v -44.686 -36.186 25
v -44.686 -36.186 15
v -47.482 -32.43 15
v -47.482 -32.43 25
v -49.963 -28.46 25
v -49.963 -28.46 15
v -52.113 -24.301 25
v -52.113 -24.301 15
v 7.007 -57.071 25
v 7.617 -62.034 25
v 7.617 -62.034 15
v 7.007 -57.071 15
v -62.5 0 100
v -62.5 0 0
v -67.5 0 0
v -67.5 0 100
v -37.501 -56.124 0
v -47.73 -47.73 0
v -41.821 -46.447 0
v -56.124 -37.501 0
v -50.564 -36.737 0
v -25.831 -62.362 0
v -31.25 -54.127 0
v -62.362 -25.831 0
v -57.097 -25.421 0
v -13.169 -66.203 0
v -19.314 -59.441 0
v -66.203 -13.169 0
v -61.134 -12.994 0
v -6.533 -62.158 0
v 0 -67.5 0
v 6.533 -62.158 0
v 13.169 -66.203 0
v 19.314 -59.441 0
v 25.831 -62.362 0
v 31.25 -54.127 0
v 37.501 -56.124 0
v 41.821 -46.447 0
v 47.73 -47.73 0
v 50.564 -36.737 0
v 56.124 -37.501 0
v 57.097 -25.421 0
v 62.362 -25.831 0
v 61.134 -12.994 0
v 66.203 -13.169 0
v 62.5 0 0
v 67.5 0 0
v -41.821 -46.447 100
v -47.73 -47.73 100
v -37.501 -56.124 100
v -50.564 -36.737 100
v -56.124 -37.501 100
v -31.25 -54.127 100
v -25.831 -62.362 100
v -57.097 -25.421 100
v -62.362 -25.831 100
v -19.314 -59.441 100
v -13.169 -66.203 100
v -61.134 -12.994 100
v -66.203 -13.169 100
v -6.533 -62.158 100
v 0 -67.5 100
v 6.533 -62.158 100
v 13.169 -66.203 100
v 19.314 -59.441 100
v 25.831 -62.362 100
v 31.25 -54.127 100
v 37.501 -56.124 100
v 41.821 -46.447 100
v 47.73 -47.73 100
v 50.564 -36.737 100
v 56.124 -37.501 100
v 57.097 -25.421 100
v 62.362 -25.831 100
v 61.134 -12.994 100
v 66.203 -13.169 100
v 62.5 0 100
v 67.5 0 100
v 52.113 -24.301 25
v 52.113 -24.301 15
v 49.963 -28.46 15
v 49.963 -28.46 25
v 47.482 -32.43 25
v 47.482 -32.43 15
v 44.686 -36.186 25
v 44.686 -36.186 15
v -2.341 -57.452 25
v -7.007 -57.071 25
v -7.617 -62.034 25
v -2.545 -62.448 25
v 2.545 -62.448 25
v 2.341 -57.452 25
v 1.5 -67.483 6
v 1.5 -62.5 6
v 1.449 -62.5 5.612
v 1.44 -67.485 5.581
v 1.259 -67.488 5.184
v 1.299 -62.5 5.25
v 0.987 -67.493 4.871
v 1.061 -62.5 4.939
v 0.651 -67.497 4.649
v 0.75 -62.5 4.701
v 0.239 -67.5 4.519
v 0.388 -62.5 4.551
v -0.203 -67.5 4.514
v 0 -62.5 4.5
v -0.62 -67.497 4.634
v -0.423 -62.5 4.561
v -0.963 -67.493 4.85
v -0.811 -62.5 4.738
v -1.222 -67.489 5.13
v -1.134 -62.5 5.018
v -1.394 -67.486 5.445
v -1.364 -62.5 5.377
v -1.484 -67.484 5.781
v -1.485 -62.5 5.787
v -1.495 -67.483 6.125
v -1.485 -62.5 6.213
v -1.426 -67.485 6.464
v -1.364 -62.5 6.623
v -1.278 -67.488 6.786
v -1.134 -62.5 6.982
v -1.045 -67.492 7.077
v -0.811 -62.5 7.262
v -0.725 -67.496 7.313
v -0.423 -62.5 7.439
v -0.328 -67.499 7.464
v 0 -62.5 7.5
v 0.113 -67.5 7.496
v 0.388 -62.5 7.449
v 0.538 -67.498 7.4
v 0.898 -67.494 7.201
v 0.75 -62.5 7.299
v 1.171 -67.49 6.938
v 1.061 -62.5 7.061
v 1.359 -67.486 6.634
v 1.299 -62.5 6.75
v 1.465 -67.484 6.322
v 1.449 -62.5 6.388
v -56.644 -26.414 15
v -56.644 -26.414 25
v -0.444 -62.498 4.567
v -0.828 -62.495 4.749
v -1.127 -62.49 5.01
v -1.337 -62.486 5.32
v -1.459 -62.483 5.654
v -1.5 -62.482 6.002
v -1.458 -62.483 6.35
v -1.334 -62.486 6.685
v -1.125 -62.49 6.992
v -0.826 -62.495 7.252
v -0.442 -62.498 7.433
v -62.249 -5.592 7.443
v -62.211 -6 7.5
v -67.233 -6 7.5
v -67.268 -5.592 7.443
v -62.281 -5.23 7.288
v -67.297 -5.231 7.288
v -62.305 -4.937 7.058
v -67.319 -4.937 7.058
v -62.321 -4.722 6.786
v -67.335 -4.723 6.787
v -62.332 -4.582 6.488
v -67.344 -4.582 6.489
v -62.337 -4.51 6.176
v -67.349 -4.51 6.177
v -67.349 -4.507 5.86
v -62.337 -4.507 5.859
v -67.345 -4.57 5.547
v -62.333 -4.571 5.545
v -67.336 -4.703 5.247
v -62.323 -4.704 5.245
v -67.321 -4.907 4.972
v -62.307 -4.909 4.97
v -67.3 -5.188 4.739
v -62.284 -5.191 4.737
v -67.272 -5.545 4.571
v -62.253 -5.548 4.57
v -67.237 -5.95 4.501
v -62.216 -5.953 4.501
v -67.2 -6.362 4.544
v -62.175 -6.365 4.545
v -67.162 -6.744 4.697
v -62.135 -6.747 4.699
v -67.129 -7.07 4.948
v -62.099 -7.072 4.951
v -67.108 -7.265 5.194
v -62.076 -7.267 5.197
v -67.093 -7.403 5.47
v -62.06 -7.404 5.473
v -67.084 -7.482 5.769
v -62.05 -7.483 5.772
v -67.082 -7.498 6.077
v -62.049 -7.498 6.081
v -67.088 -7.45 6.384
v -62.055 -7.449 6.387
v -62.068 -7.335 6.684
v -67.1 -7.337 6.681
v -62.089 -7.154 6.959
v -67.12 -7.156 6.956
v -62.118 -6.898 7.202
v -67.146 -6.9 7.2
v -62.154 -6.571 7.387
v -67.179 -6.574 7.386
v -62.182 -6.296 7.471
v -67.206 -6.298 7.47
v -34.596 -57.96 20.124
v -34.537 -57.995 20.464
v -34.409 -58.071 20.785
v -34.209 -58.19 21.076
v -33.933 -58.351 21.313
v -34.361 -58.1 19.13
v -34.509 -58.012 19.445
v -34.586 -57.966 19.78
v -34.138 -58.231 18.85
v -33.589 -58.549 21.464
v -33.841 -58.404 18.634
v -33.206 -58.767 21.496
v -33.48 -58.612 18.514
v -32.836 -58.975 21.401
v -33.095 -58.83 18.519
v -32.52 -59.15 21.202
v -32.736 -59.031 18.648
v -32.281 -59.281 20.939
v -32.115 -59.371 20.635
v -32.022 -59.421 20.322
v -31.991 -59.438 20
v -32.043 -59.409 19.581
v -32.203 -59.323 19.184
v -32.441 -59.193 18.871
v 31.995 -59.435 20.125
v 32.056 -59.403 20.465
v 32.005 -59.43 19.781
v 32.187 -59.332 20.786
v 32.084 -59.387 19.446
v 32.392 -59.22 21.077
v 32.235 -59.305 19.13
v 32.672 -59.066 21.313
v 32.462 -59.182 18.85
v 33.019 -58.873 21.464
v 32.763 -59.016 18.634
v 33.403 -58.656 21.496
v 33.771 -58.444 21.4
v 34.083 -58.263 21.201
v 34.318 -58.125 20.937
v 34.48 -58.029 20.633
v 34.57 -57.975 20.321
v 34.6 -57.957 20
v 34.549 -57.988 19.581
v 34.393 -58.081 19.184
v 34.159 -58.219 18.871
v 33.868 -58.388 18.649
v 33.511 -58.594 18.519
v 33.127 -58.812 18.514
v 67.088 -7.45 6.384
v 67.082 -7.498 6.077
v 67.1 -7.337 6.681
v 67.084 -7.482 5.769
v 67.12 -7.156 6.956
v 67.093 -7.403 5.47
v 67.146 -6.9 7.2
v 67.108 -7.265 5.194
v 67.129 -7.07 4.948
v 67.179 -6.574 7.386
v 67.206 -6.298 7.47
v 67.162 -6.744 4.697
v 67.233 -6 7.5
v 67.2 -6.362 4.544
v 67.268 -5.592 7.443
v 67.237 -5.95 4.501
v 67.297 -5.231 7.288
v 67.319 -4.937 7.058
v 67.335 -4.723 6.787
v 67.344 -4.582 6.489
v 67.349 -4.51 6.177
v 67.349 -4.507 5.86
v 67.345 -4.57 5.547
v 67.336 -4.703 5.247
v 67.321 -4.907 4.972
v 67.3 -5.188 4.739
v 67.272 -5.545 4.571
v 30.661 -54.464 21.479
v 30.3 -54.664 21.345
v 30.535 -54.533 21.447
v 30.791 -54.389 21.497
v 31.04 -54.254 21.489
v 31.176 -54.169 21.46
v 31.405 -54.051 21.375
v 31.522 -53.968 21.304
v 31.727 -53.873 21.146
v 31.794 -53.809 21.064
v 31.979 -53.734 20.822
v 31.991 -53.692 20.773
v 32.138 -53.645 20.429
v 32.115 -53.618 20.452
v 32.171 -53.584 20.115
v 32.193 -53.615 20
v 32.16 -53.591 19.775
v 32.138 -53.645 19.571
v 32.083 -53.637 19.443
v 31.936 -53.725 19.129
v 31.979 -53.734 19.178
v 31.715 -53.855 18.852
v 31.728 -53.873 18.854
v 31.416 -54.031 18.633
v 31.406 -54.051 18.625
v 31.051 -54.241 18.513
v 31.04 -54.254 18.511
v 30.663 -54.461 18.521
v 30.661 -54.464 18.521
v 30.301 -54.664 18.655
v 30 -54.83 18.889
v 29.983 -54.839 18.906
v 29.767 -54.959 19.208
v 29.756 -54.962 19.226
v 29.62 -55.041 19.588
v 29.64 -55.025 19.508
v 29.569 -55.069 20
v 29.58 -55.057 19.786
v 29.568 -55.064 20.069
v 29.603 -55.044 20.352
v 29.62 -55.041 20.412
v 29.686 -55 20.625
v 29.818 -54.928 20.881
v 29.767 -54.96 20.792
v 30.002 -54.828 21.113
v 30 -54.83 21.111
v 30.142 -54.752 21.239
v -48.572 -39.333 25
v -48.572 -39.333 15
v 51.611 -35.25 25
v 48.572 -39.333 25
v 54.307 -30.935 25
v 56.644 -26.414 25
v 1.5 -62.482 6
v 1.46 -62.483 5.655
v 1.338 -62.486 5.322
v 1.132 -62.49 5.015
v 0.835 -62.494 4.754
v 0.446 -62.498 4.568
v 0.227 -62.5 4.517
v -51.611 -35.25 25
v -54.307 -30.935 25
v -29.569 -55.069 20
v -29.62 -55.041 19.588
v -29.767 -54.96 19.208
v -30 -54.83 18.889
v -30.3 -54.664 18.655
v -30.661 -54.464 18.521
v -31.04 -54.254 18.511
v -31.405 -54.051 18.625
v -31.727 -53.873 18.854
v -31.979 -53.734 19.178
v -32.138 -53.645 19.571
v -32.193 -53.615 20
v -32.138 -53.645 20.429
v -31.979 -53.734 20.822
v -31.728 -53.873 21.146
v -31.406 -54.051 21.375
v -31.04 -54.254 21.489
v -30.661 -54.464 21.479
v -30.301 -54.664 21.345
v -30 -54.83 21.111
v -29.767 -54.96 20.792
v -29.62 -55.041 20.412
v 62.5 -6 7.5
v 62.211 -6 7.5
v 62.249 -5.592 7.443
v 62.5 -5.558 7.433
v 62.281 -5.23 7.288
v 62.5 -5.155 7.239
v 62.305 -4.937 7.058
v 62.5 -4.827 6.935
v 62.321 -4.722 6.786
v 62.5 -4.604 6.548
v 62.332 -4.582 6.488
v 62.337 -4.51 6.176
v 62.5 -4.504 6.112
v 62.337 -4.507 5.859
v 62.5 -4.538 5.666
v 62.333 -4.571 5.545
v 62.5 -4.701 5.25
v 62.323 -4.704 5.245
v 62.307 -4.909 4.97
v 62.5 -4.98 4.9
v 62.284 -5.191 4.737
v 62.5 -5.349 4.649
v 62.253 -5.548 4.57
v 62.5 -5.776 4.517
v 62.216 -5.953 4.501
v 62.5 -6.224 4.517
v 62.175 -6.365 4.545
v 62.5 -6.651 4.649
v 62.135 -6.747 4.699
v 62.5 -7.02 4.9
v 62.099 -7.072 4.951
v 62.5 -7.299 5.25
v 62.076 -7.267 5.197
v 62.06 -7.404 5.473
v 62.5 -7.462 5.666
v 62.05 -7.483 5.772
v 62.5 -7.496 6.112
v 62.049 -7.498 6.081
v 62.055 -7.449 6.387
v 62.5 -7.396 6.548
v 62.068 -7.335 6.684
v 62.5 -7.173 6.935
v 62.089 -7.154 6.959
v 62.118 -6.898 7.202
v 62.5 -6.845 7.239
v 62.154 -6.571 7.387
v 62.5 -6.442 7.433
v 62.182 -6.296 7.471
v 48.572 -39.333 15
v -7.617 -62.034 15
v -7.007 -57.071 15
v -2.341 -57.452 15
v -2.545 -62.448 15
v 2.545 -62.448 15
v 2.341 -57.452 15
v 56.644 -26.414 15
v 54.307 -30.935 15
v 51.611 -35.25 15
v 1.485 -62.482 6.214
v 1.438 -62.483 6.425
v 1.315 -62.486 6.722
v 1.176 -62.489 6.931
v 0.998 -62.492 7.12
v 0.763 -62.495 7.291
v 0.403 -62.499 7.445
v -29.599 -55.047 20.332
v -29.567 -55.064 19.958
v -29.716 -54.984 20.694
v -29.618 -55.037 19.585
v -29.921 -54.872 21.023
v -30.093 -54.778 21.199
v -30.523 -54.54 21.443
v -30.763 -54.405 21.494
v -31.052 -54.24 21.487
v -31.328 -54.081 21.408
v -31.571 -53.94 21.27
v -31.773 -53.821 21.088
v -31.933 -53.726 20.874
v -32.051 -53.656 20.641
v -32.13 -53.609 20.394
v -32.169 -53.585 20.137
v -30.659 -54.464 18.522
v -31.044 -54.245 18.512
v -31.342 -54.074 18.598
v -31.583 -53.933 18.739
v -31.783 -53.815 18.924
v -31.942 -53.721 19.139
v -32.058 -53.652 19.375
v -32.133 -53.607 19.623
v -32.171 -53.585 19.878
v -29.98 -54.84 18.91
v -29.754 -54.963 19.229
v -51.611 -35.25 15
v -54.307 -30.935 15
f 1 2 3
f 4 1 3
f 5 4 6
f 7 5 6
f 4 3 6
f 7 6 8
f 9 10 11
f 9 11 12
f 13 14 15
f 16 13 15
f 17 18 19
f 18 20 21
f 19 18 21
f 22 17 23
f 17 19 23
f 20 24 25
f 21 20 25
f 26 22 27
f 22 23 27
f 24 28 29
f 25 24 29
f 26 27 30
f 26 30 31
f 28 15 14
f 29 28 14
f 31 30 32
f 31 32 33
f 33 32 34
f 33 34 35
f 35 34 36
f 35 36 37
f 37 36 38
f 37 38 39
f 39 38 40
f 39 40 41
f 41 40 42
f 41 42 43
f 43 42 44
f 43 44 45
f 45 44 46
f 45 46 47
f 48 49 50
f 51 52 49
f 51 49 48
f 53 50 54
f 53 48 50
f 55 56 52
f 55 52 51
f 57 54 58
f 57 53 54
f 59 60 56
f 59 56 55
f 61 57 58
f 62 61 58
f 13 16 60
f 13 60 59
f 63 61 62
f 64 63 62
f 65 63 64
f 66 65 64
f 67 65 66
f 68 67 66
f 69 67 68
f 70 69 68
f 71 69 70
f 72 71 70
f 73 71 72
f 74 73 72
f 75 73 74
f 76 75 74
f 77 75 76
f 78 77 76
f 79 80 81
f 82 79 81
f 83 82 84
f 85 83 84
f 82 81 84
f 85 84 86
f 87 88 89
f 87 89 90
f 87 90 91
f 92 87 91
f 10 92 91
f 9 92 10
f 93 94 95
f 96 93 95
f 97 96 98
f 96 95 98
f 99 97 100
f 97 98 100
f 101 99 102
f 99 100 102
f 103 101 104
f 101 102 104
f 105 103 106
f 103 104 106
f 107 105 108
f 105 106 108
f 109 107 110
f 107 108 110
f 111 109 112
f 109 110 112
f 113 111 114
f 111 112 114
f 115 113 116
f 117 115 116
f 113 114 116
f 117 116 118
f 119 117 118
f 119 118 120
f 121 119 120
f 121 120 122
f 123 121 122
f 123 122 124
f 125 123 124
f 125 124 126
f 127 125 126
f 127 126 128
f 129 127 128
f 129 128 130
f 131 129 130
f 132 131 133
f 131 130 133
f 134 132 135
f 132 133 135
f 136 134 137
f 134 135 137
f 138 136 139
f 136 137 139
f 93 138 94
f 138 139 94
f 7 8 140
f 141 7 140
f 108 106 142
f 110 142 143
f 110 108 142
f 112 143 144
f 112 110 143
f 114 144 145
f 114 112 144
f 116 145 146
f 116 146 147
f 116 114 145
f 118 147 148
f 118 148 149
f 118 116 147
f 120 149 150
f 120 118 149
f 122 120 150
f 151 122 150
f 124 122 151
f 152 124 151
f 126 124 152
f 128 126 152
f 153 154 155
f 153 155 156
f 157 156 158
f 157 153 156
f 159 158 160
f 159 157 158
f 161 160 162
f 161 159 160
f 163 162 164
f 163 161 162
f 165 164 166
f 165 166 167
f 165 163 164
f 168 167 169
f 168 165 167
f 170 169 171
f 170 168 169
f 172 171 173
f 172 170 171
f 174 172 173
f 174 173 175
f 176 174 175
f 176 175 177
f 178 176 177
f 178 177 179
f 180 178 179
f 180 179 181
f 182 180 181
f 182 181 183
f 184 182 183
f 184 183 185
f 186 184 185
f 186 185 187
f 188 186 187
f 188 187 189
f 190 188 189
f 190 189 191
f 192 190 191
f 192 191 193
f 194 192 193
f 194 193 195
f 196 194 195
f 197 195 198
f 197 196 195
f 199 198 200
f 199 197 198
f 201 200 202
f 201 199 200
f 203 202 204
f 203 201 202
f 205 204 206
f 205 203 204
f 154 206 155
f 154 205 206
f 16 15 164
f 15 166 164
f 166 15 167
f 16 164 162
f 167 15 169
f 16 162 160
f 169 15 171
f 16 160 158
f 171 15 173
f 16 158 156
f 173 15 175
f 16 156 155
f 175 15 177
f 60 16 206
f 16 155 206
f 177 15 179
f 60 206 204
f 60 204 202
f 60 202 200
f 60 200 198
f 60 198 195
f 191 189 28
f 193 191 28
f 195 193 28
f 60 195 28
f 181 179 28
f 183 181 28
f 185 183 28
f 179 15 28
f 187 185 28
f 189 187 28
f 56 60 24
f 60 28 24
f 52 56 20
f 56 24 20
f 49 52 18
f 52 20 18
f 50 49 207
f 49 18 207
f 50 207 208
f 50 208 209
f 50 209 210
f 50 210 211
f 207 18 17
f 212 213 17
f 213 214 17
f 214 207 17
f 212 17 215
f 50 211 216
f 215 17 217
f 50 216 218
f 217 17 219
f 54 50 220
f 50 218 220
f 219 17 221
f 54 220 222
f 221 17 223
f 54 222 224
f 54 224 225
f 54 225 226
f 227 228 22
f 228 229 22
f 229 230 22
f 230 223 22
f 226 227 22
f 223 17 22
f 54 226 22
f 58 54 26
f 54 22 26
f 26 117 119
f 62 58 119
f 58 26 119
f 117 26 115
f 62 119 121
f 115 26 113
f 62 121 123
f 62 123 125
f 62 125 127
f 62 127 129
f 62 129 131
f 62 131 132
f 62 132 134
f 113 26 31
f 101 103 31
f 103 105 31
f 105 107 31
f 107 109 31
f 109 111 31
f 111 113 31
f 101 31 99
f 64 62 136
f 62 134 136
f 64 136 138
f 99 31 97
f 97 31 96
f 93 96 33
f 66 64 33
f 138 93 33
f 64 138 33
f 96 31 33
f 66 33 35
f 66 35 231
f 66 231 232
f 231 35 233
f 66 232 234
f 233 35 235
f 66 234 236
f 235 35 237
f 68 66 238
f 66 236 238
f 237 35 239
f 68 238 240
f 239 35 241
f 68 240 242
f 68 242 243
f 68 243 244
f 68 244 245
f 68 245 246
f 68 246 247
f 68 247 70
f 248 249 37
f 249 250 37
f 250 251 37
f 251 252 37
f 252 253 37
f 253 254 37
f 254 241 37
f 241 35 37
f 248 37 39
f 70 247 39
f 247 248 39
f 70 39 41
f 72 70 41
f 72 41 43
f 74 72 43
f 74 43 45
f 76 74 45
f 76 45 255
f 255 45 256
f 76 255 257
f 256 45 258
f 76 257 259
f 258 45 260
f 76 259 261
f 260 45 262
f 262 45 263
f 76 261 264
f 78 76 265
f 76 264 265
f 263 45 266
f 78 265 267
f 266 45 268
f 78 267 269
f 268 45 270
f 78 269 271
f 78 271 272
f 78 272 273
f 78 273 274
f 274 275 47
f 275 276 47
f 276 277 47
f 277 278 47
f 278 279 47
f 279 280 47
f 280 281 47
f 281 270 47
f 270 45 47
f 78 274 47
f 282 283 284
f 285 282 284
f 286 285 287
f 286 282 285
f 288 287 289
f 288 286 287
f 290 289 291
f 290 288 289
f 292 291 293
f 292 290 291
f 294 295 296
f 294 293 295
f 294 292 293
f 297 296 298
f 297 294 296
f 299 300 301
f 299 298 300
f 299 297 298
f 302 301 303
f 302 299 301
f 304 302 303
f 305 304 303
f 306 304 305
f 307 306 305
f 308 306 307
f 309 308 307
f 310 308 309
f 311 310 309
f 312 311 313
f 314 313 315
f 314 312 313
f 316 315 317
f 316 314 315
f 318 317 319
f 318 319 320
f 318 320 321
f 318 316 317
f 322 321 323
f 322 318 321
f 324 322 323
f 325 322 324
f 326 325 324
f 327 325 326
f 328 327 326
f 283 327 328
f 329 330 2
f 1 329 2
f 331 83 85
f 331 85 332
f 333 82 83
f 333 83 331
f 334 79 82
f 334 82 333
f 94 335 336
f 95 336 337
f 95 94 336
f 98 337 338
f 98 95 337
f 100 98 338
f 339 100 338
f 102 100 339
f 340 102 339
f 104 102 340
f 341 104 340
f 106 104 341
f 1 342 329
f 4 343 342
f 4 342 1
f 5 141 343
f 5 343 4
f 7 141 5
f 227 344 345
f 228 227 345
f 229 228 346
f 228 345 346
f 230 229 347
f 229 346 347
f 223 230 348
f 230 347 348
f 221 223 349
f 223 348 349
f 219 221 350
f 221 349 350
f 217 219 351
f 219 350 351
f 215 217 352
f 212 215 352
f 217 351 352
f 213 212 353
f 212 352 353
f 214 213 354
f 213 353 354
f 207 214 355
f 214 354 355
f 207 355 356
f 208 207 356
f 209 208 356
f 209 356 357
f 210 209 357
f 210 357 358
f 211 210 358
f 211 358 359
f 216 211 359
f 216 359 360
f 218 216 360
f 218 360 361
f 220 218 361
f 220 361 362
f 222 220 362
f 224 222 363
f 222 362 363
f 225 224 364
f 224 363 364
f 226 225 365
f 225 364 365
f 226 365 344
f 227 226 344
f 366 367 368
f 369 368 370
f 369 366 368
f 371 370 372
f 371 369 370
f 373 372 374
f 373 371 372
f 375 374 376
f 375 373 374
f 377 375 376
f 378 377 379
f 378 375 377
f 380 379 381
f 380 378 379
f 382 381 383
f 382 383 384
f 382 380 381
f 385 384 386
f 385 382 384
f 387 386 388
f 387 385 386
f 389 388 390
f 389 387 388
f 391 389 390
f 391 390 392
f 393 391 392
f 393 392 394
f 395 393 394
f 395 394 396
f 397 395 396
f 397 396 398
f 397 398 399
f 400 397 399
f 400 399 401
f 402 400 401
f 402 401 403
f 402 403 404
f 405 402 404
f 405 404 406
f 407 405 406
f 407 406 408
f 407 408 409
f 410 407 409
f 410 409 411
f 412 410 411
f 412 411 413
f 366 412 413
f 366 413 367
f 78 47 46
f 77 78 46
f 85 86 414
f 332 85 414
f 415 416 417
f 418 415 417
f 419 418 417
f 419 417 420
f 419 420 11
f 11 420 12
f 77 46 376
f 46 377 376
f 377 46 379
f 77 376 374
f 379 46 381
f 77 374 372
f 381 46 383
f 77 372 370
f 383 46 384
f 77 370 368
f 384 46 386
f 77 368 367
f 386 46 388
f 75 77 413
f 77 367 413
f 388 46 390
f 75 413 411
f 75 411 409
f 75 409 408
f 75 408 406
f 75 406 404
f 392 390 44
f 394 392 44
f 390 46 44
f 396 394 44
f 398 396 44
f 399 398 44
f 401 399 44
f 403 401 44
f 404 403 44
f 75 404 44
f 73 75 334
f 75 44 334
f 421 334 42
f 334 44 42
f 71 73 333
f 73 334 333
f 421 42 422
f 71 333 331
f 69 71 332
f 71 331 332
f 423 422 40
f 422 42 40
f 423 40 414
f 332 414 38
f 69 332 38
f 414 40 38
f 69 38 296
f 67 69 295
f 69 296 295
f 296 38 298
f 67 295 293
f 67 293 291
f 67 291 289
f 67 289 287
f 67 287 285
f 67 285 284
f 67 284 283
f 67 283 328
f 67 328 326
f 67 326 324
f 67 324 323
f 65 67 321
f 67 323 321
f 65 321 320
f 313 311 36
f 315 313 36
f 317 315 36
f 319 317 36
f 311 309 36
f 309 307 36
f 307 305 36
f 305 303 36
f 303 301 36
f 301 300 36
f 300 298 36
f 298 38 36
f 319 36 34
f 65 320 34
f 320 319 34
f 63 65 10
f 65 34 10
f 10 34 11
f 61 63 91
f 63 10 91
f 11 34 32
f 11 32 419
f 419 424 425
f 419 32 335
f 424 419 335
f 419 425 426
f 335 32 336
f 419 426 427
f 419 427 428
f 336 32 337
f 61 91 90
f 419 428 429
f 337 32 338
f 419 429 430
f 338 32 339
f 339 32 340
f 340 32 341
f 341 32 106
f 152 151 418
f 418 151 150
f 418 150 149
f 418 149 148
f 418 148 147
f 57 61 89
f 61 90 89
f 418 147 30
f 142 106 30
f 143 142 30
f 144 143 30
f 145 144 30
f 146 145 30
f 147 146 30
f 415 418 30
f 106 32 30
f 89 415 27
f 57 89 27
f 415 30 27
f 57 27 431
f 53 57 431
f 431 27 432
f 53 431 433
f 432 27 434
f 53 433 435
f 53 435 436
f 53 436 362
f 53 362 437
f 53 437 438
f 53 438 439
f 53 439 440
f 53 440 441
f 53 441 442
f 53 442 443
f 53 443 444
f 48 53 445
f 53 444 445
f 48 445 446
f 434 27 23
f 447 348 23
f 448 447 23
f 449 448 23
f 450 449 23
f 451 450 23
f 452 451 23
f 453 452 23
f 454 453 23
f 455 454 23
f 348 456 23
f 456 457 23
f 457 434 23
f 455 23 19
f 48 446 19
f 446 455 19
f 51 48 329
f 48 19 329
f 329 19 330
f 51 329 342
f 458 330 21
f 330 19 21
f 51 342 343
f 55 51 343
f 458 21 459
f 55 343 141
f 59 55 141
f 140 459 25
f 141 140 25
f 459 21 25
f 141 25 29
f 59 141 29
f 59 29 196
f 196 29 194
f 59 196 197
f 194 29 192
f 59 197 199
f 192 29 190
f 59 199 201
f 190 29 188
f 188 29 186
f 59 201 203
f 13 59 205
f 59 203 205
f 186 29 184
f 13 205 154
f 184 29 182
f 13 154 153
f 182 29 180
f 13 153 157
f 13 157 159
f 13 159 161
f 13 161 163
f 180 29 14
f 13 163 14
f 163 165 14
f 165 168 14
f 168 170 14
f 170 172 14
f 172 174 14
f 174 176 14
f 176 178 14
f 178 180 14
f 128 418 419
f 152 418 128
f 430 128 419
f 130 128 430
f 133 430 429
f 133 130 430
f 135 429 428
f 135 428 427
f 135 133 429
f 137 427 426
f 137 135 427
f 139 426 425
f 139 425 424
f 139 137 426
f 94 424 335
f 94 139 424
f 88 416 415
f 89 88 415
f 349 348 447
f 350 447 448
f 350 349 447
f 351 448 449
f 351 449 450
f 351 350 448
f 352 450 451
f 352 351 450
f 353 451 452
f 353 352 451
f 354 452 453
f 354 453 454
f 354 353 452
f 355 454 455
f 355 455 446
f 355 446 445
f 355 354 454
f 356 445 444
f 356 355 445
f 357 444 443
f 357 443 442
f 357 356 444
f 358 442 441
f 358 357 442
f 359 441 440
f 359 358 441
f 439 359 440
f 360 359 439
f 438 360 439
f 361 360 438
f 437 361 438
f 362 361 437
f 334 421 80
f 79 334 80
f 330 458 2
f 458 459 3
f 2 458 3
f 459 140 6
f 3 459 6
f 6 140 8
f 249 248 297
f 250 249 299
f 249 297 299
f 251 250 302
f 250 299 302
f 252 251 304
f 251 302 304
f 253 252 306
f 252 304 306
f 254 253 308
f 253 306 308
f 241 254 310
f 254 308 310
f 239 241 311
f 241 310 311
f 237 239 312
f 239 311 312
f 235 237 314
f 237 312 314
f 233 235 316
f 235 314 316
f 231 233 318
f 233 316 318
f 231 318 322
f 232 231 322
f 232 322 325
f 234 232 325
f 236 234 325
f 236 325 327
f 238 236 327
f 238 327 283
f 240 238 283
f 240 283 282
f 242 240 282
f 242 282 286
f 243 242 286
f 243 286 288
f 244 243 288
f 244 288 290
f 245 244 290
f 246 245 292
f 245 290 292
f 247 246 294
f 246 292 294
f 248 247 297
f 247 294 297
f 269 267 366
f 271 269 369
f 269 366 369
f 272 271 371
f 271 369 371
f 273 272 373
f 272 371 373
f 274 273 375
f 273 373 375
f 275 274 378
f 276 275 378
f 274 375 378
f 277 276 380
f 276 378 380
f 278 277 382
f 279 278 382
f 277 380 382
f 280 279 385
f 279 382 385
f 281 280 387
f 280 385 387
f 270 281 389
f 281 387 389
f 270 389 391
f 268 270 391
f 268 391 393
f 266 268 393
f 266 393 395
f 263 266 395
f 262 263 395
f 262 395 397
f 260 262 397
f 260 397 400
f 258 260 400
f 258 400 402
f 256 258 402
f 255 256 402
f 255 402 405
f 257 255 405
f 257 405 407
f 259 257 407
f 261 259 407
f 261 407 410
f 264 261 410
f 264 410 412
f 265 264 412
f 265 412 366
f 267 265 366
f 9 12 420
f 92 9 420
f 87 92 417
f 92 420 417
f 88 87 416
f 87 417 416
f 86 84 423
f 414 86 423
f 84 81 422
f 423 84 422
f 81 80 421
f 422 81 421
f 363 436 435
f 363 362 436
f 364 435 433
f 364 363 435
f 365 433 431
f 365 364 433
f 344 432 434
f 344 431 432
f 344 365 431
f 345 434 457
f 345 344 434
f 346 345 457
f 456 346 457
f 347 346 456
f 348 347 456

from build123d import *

# Parameters (mm, degrees)
BOSS_EXTRUDE1_DEPTH     = 100
BOSS_EXTRUDE3_DEPTH     = 10
CUT_EXTRUDE1_DEPTH      = 149
CUT_EXTRUDE1_DEPTH_BACK = 16
SKETCH4_R               = 1.5
CUT_EXTRUDE2_DEPTH      = 16
CUT_EXTRUDE2_DEPTH_BACK = 16
SKETCH5_R               = 1.5
CUT_EXTRUDE3_DEPTH      = 16
CUT_EXTRUDE3_DEPTH_BACK = 16
SKETCH6_R               = 1.5
CUT_EXTRUDE4_DEPTH      = 16
CUT_EXTRUDE4_DEPTH_BACK = 16
SKETCH7_R               = 1.5


with BuildPart() as part:
    # Sketch1 → Boss-Extrude1 (new body)
    with BuildSketch(Plane.XY):
        with BuildLine():
            ThreePointArc((62.5, 0), (0, -62.5), (-62.5, 0))
            Line((-62.5, 0), (-67.5, 0))
            ThreePointArc((-67.5, 0), (0, -67.5), (67.5, 0))
            Line((67.5, 0), (62.5, 0))
        make_face()
    extrude(amount=BOSS_EXTRUDE1_DEPTH)

    # Sketch3 → Boss-Extrude3 (add)
    with BuildSketch(Plane.XY.offset(15)):
        with BuildLine():
            Line((-52.112697755, -24.30055005), (-56.64423669, -26.413641359))
            ThreePointArc((-56.64423669, -26.413641359), (-53.00300601, -33.119954015), (-48.571622591, -39.332524441))
            Line((-48.571622591, -39.332524441), (-44.685892784, -36.185922485))
            ThreePointArc((-44.685892784, -36.185922485), (-48.762765529, -30.470357693), (-52.112697755, -24.30055005))
        make_face()
        with BuildLine():
            ThreePointArc((48.571622591, -39.332524441), (53.00300601, -33.119954015), (56.64423669, -26.413641359))
            Line((56.64423669, -26.413641359), (52.112697755, -24.30055005))
            ThreePointArc((52.112697755, -24.30055005), (48.762765529, -30.470357693), (44.685892784, -36.185922485))
            Line((44.685892784, -36.185922485), (48.571622591, -39.332524441))
        make_face()
        with BuildLine():
            Line((-7.007487246, -57.071403719), (-7.616833963, -62.034134478))
            ThreePointArc((-7.616833963, -62.034134478), (0, -62.5), (7.616833963, -62.034134478))
            Line((7.616833963, -62.034134478), (7.007487246, -57.071403719))
            ThreePointArc((7.007487246, -57.071403719), (0, -57.5), (-7.007487246, -57.071403719))
        make_face()
    extrude(amount=BOSS_EXTRUDE3_DEPTH)

    # Sketch4 → Cut-Extrude1 (cut, two sides: drawn at the far end of the back side and taken through both)
    with BuildSketch(Plane.ZY.offset(-62.5).offset(-CUT_EXTRUDE1_DEPTH_BACK)):
        with Locations((6, -6)):
            Circle(SKETCH4_R)
    extrude(amount=CUT_EXTRUDE1_DEPTH + CUT_EXTRUDE1_DEPTH_BACK, mode=Mode.SUBTRACT)

    # Sketch5 → Cut-Extrude2 (cut, two sides: drawn at the far end of the back side and taken through both)
    with BuildSketch(Plane(origin=(0, -62.5, 0), x_dir=(1, 0, 0), z_dir=(0, 1, 0)).offset(-CUT_EXTRUDE2_DEPTH_BACK)):
        with Locations((0, -6)):
            Circle(SKETCH5_R)
    extrude(amount=CUT_EXTRUDE2_DEPTH + CUT_EXTRUDE2_DEPTH_BACK, mode=Mode.SUBTRACT)

    # Sketch6 → Cut-Extrude3 (cut, two sides: drawn at the far end of the back side and taken through both)
    with BuildSketch(Plane(origin=(-30.300601265, -54.663731696, 0), x_dir=(0.8746197071393957, -0.48480962024633734, 0), z_dir=(0.48480962024633734, 0.8746197071393957, 0)).offset(-CUT_EXTRUDE3_DEPTH_BACK)):
        with Locations((-0.663731696, -20)):
            Circle(SKETCH6_R)
    extrude(amount=CUT_EXTRUDE3_DEPTH + CUT_EXTRUDE3_DEPTH_BACK, mode=Mode.SUBTRACT)

    # Sketch7 → Cut-Extrude4 (cut, two sides: drawn at the far end of the back side and taken through both)
    with BuildSketch(Plane(origin=(30.300601265, -54.663731696, 0), x_dir=(0.8746197071393963, 0.4848096202463363, 0), z_dir=(-0.4848096202463362, 0.8746197071393962, 0)).offset(-CUT_EXTRUDE4_DEPTH_BACK)):
        with Locations((0.663731696, -20)):
            Circle(SKETCH7_R)
    extrude(amount=CUT_EXTRUDE4_DEPTH + CUT_EXTRUDE4_DEPTH_BACK, mode=Mode.SUBTRACT)


solid = part.part
